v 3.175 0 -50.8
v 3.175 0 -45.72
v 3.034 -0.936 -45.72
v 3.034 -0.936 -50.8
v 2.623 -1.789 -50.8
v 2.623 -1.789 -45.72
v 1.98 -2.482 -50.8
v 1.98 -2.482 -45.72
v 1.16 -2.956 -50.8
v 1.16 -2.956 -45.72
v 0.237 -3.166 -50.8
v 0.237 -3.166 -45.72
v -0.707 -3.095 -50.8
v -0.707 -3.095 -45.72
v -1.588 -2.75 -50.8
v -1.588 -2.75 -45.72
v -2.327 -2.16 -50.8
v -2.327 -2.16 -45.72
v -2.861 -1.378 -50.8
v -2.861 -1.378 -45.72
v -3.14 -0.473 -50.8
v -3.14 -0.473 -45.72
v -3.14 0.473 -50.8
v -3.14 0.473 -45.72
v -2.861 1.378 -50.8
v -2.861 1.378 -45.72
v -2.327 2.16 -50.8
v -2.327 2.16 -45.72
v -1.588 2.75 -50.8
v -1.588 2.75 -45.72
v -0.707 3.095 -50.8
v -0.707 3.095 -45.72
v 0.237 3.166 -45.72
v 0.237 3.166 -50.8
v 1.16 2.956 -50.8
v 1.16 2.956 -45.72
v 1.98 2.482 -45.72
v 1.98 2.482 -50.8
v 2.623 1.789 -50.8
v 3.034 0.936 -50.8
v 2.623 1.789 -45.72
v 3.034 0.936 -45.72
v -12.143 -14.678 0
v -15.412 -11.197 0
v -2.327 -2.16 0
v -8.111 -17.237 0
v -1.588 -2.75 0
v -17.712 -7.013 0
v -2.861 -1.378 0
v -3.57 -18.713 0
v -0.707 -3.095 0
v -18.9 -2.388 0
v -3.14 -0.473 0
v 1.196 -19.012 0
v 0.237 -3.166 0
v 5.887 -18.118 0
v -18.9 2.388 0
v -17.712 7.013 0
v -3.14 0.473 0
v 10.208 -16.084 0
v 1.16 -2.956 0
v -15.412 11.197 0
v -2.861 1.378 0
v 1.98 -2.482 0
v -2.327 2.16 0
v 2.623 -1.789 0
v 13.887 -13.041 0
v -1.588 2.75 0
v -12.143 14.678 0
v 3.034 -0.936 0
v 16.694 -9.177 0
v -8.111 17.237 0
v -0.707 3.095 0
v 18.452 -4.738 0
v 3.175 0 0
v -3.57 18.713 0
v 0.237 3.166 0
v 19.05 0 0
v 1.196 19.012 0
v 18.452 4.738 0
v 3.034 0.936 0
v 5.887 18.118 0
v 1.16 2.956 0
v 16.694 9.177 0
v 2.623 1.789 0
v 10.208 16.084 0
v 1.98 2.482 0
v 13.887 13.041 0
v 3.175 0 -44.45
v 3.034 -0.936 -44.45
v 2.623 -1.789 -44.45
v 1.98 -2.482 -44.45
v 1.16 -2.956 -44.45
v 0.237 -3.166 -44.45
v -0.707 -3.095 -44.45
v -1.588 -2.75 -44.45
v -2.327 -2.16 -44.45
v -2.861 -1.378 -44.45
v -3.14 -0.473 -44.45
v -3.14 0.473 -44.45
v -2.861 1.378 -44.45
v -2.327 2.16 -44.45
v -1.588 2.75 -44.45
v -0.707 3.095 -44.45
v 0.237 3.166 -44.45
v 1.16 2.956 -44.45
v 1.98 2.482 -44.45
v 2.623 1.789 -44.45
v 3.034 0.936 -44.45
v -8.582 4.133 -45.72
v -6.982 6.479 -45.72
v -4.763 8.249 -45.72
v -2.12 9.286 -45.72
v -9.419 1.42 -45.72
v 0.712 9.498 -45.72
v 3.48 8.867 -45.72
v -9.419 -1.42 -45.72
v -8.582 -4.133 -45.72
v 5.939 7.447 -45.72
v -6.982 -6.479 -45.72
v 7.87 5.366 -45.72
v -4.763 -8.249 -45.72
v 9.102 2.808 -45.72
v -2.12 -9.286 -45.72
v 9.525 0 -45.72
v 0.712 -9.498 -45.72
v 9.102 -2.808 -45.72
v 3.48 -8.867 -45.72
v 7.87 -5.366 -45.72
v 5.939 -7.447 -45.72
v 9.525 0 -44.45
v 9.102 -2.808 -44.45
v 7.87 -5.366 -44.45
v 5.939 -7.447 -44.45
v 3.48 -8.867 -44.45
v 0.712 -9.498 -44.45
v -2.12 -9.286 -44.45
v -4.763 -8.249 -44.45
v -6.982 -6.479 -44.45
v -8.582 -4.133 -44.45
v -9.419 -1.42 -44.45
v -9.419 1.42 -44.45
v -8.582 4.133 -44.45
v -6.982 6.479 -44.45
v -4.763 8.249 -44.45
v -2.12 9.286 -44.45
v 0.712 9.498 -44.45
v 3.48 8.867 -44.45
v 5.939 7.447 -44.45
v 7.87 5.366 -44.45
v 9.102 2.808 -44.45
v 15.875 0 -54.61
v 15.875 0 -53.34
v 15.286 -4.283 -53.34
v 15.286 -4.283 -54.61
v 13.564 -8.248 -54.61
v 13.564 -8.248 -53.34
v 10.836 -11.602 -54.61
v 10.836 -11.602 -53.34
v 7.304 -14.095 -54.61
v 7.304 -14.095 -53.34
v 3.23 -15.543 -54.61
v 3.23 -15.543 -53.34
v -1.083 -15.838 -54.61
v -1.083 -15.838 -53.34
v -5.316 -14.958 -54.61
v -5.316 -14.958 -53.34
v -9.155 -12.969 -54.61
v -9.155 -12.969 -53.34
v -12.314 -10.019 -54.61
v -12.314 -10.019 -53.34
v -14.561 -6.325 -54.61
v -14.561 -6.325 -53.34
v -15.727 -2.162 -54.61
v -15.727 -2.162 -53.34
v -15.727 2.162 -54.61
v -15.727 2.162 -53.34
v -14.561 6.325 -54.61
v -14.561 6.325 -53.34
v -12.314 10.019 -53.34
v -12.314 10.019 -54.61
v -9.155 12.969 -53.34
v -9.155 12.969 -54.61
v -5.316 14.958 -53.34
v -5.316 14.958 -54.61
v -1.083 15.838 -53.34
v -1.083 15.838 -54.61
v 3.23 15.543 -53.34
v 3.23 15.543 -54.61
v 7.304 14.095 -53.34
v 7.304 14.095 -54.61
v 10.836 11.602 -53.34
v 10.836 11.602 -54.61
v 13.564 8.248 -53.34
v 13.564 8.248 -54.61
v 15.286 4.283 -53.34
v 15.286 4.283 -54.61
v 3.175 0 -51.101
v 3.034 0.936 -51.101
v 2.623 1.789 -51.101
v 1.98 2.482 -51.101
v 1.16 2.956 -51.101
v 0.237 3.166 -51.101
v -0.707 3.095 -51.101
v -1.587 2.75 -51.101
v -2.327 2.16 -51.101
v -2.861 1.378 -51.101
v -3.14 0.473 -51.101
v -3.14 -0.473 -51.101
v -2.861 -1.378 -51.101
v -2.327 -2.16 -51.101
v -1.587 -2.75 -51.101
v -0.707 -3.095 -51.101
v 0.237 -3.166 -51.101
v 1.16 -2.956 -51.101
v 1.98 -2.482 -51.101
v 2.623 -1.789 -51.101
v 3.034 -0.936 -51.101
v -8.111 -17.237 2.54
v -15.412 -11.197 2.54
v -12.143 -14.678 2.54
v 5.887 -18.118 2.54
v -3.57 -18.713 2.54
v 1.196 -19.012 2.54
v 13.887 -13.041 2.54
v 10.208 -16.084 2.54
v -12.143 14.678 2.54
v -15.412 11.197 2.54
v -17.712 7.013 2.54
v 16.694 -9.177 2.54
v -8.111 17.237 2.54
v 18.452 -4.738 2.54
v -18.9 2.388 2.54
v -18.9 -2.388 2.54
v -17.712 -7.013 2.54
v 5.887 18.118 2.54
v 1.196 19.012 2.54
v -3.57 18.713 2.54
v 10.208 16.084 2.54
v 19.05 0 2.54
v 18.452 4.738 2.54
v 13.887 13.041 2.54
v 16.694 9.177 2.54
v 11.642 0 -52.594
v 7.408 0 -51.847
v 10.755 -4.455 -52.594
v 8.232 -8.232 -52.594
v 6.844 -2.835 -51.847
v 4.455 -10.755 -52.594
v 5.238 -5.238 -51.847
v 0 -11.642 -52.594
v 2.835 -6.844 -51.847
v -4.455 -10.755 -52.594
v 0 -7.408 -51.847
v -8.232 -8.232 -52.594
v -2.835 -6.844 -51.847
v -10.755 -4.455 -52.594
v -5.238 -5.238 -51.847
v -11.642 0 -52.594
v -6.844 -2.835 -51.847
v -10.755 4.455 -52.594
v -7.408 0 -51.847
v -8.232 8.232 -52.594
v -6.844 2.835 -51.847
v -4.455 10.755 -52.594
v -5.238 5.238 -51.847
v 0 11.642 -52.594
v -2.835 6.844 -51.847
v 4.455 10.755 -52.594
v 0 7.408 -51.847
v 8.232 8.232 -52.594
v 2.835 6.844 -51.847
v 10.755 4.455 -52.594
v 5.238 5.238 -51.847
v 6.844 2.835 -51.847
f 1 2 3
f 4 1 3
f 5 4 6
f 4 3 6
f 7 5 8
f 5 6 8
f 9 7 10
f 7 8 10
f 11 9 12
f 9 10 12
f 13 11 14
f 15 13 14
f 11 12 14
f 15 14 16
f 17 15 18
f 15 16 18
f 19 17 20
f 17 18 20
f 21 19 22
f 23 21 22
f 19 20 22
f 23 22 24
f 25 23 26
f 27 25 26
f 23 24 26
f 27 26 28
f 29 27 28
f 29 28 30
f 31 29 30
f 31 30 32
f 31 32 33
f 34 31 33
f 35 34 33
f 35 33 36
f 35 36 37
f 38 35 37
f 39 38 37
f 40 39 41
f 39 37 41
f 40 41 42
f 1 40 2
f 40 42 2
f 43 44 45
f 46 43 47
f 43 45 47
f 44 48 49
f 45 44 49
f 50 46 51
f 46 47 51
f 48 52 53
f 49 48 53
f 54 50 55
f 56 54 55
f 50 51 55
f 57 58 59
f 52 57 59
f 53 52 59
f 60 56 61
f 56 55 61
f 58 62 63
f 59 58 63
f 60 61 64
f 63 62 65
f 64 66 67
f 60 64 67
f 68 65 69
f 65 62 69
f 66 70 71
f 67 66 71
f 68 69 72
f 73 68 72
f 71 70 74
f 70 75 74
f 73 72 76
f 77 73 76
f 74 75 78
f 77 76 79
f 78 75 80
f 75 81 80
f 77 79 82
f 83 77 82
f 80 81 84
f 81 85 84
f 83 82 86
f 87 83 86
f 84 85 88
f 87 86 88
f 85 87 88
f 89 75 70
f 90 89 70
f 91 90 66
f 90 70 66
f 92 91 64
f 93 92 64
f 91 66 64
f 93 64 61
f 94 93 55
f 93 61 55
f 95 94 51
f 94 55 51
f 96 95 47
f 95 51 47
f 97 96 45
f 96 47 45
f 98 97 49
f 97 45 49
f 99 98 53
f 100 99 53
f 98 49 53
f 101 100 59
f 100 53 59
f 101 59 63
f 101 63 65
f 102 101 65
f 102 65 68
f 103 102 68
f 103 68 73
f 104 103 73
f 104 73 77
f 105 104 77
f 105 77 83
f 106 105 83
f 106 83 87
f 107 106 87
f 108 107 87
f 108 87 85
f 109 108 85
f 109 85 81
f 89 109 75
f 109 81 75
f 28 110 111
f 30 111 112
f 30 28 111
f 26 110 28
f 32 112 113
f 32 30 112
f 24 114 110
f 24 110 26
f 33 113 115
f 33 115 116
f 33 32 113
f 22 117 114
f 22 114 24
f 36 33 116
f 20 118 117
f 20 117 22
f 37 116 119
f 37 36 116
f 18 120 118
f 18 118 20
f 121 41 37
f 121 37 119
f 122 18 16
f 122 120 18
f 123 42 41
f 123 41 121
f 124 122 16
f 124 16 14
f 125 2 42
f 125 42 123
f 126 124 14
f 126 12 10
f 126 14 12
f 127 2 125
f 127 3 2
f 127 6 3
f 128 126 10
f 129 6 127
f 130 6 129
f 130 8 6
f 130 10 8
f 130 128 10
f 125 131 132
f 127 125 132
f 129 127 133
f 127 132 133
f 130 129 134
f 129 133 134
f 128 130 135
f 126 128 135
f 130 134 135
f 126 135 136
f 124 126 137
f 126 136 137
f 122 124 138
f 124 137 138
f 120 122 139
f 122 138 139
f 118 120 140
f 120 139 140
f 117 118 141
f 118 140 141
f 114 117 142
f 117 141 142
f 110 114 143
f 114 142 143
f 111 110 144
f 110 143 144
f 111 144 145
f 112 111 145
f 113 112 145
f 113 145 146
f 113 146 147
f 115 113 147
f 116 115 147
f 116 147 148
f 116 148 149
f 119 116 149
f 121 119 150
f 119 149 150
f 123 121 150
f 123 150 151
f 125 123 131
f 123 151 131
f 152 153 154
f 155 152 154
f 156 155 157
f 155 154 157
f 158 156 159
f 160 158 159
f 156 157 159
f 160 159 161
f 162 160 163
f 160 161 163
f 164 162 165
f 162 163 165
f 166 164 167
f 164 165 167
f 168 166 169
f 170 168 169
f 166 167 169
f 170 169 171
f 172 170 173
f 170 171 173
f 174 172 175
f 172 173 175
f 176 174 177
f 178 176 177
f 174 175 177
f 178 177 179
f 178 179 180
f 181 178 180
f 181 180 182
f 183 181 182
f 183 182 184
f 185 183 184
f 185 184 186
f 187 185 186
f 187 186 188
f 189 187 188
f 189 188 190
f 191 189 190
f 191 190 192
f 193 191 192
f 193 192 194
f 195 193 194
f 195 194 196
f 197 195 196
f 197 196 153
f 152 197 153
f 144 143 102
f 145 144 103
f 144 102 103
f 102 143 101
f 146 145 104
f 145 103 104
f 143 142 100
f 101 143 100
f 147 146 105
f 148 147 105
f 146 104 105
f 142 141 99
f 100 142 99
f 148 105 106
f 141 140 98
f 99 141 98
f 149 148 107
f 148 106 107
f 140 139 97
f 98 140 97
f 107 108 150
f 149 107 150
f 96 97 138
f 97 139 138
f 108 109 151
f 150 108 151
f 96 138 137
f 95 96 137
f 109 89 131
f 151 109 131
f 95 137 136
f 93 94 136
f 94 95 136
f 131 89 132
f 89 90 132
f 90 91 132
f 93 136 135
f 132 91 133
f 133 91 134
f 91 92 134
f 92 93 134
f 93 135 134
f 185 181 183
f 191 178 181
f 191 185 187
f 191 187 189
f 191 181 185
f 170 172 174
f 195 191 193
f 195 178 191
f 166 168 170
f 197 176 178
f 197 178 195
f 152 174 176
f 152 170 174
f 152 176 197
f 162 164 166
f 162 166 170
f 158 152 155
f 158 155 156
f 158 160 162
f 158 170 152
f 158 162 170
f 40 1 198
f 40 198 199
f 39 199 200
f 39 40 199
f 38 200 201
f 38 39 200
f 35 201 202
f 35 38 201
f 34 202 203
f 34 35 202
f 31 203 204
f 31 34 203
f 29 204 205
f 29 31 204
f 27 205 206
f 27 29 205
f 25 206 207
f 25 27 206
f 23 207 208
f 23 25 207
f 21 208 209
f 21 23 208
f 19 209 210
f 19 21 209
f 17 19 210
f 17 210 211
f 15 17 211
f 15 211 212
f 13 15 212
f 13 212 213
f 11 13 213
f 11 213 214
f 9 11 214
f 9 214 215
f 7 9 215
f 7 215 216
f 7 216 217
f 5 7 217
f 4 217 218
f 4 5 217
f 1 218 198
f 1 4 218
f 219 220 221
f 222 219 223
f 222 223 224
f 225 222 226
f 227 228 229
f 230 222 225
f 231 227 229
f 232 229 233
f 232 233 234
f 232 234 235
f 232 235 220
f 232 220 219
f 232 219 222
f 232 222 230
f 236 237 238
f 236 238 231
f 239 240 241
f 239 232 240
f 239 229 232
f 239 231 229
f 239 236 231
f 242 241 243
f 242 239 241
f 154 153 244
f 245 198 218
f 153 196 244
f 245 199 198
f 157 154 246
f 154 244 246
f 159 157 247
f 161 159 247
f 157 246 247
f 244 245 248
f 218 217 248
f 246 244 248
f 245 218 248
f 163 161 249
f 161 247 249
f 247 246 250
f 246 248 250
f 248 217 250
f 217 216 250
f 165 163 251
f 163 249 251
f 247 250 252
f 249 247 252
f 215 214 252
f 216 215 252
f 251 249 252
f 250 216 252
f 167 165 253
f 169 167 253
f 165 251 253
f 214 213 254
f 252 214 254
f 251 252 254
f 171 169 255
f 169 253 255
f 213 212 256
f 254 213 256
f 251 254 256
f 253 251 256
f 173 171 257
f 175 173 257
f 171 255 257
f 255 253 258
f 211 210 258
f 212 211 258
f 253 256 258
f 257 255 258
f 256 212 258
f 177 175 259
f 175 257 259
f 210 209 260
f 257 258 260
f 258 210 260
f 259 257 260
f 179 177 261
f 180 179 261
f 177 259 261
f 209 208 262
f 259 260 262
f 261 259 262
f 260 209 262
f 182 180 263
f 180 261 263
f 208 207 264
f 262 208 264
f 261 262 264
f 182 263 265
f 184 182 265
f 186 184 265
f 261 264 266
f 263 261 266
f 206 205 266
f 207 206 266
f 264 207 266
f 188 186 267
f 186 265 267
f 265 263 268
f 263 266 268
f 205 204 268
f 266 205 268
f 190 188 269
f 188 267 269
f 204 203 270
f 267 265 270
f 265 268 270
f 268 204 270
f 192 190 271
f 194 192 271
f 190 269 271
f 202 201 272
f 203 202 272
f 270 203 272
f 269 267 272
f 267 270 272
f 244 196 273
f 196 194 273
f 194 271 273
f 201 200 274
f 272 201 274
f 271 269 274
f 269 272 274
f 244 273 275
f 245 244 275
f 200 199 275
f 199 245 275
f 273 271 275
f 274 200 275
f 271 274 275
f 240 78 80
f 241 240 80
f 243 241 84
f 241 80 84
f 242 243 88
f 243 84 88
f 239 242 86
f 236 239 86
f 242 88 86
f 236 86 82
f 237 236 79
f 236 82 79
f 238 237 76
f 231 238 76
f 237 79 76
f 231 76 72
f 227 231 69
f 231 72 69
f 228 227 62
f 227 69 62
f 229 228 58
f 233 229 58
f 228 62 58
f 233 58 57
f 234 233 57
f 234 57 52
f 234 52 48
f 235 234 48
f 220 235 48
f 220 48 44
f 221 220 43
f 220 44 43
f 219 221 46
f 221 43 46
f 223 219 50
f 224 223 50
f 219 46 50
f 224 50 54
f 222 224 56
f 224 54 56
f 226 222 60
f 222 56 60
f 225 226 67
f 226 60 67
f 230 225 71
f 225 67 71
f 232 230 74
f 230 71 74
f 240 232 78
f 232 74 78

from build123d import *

# Parameters (mm, degrees)
F0_R         = 19.05
F1_DEPTH     = 2.54
F2_R         = 3.175
F3_DEPTH     = 44.45
F4_R         = 9.525
F5_DEPTH     = 1.27
F6_R         = 3.175
F7_DEPTH     = 5.08
F8_R         = 15.875
F9_DEPTH     = 3.81
F10_S5_R     = 3.175
F10_T6_DEPTH = 24


# Not quite as in the source:
# - a fillet or chamfer that OpenCascade refuses, or shapes differently, is made with other operations: its cross-section is extruded or revolved along the edge and cut away or added


with BuildPart() as f1:
    # F0 (on Top) → F1 (new body)
    with BuildSketch(Plane.XY):
        Circle(F0_R)
    extrude(amount=F1_DEPTH)

    # F2 (on face) → F3 (join)
    with BuildSketch(Plane(origin=(0, 0, 0), x_dir=(1, 0, 0), z_dir=(0, 0, -1))):
        Circle(F2_R)
    extrude(amount=F3_DEPTH)

    # F4 (on face) → F5 (join)
    with BuildSketch(Plane(origin=(0, 0, -44.45), x_dir=(1, 0, 0), z_dir=(0, 0, -1))):
        Circle(F4_R)
    extrude(amount=F5_DEPTH)

    # F6 (on face) → F7 (join)
    with BuildSketch(Plane(origin=(0, 0, -45.72), x_dir=(1, 0, 0), z_dir=(0, 0, -1))):
        Circle(F6_R)
    extrude(amount=F7_DEPTH)

    # F8 (on face) → F9 (join)
    with BuildSketch(Plane(origin=(0, 0, -50.8), x_dir=(1, 0, 0), z_dir=(0, 0, -1))):
        Circle(F8_R)
    extrude(amount=F9_DEPTH)

    # F10: chamfer of 2.54 x 14.4050558218 on 1 edges, made by hand


with BuildPart() as f10_tool2:
    # F10_s3 → F10_t4 (revolve)
    with BuildSketch(Plane.XZ):
        Polygon((15.875, -53.34), (1.4699441782, -50.8), (15.875, -50.8), align=None)
    revolve(axis=Axis((0, 0, -50.8), (0, 0, -1)))

    # F10_s5 → F10_t6 (cut, symmetric)
    with BuildSketch(Plane.XY.offset(-52.1)):
        Circle(F10_S5_R)
    extrude(amount=F10_T6_DEPTH, both=True, mode=Mode.SUBTRACT)


with BuildPart() as f1_1:
    add(f1.part)

    # F10_t1: cut F10_tool2
    add(f10_tool2.part, mode=Mode.SUBTRACT)


solid = f1_1.part
